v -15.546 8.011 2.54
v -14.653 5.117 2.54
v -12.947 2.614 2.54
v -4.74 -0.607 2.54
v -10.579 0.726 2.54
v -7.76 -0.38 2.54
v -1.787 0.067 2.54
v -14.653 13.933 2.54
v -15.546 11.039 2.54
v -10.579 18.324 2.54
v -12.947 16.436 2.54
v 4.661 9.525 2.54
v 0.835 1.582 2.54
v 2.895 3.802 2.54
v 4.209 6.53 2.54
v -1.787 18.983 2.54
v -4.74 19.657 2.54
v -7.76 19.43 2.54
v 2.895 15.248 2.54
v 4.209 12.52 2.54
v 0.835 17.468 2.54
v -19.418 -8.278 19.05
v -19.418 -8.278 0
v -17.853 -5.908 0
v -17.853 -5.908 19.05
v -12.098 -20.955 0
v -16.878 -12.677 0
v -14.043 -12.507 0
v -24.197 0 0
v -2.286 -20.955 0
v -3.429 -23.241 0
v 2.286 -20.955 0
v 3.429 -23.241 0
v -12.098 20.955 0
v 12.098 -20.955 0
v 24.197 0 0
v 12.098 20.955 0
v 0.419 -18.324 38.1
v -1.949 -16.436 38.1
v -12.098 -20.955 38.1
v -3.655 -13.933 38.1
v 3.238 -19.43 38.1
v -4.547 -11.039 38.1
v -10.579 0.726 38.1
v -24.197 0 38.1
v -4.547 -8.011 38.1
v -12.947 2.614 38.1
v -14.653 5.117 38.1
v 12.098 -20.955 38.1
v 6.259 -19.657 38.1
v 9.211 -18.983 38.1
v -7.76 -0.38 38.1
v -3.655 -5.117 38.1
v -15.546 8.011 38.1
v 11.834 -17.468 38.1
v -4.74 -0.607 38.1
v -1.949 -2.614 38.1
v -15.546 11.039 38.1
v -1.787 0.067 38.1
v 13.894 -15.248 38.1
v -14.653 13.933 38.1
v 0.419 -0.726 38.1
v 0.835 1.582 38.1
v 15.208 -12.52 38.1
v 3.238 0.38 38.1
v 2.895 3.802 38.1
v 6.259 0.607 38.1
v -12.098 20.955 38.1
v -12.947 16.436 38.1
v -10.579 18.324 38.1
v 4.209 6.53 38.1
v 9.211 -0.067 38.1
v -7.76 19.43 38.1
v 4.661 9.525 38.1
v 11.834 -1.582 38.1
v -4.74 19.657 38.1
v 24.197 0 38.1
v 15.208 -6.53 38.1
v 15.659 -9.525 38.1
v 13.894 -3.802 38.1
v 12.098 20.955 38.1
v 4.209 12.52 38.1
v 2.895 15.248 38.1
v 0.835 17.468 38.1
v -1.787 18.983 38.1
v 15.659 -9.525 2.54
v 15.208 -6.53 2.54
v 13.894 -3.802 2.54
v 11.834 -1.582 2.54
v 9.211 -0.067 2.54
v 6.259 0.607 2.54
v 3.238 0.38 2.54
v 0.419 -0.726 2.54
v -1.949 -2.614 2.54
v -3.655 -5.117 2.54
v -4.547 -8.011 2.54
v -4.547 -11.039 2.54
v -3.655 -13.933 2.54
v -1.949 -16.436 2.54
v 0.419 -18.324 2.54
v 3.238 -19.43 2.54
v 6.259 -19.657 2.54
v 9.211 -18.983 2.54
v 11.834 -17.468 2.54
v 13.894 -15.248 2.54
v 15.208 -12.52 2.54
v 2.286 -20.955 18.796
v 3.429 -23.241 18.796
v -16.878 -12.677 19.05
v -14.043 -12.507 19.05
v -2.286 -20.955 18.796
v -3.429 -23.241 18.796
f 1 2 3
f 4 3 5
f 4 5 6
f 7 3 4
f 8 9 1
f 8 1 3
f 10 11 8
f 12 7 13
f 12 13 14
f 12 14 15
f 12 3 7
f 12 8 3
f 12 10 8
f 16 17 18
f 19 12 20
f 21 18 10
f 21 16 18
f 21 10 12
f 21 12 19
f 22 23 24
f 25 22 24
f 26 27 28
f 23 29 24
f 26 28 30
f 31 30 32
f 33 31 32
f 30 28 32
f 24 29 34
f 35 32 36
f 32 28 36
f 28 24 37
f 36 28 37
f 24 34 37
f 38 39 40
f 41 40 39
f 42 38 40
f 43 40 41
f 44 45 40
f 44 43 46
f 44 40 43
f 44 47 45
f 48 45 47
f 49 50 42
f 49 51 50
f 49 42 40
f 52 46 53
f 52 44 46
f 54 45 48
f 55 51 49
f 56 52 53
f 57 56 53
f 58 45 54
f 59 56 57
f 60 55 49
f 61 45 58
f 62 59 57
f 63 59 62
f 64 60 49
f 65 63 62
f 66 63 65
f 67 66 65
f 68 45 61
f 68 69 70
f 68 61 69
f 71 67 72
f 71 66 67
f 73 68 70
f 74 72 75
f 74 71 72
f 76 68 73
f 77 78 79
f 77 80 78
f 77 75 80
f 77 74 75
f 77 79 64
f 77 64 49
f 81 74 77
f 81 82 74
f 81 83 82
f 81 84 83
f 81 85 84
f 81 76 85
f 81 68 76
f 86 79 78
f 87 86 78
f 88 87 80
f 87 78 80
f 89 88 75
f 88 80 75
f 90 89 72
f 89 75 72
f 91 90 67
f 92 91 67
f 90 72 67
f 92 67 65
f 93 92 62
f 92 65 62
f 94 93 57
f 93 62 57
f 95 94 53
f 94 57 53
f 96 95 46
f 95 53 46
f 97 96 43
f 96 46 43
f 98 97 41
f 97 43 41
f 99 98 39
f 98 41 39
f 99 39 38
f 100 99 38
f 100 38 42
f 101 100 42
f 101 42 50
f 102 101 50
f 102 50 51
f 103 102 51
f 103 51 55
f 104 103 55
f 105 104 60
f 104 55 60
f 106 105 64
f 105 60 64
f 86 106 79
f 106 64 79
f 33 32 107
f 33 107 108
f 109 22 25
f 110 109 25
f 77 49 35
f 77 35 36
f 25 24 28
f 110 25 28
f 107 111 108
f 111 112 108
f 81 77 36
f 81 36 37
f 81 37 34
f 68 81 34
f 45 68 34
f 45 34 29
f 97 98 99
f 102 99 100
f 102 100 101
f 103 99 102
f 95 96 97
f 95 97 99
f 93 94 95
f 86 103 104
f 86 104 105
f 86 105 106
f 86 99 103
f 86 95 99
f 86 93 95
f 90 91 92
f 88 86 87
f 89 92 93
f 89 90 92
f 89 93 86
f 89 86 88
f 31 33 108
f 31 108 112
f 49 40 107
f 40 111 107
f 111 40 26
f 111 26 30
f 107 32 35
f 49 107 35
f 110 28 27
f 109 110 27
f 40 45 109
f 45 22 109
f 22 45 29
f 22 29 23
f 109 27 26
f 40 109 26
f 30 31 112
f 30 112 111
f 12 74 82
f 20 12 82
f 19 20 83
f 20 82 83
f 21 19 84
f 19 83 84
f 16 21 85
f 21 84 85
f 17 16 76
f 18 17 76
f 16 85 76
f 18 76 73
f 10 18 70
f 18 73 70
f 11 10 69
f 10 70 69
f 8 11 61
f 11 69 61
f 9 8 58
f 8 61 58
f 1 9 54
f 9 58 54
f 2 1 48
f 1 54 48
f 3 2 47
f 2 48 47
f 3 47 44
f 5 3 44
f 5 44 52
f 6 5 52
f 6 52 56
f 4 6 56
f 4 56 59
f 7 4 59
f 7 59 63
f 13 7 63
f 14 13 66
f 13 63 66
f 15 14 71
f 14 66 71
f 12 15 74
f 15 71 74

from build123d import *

# Parameters (mm, degrees)
F1_DEPTH = 38.1
F2_R     = 10.16
F3_DEPTH = 35.56
F5_DEPTH = 19.05
F7_DEPTH = 18.796


with BuildPart() as f1:
    # F0 (on Top) → F1 (new body)
    with BuildSketch(Plane.XY):
        Polygon((-12.0983748909, -20.955), (12.0983748909, -20.955), (24.1967497817, 0), (12.0983748909, 20.955), (-12.0983748909, 20.955), (-24.1967497817, 0), align=None)
    extrude(amount=F1_DEPTH)

    # F2 (on face) → F3 (cut)
    with BuildSketch(Plane.XY.offset(38.1)):
        with Locations((-5.499261314, 9.525)):
            Circle(F2_R)
        with Locations((5.499261314, -9.525)):
            Circle(F2_R)
    extrude(amount=-F3_DEPTH, mode=Mode.SUBTRACT)

    # F4 (on face) → F5 (cut)
    with BuildSketch(Plane(origin=(0, 0, 0), x_dir=(1, 0, 0), z_dir=(0, 0, -1))):
        Polygon((-15.9478578107, 9.2075), (-18.1475623363, 10.4775), (-19.4175623363, 8.2777954744), (-17.8528578107, 5.9079432116), align=None)
        Polygon((-16.8775623363, 12.6772045256), (-18.1475623363, 10.4775), (-15.9478578107, 9.2075), (-14.0428578107, 12.5070567884), align=None)
    extrude(amount=-F5_DEPTH, mode=Mode.SUBTRACT)

    # F6 (on face) → F7 (join)
    with BuildSketch(Plane(origin=(0, 0, 0), x_dir=(1, 0, 0), z_dir=(0, 0, -1))):
        Polygon((-2.286, 20.955), (0, 20.955), (0, 23.241), (-3.429, 23.241), align=None)
        Polygon((0, 23.241), (0, 20.955), (2.286, 20.955), (3.429, 23.241), align=None)
    extrude(amount=-F7_DEPTH)


solid = f1.part
